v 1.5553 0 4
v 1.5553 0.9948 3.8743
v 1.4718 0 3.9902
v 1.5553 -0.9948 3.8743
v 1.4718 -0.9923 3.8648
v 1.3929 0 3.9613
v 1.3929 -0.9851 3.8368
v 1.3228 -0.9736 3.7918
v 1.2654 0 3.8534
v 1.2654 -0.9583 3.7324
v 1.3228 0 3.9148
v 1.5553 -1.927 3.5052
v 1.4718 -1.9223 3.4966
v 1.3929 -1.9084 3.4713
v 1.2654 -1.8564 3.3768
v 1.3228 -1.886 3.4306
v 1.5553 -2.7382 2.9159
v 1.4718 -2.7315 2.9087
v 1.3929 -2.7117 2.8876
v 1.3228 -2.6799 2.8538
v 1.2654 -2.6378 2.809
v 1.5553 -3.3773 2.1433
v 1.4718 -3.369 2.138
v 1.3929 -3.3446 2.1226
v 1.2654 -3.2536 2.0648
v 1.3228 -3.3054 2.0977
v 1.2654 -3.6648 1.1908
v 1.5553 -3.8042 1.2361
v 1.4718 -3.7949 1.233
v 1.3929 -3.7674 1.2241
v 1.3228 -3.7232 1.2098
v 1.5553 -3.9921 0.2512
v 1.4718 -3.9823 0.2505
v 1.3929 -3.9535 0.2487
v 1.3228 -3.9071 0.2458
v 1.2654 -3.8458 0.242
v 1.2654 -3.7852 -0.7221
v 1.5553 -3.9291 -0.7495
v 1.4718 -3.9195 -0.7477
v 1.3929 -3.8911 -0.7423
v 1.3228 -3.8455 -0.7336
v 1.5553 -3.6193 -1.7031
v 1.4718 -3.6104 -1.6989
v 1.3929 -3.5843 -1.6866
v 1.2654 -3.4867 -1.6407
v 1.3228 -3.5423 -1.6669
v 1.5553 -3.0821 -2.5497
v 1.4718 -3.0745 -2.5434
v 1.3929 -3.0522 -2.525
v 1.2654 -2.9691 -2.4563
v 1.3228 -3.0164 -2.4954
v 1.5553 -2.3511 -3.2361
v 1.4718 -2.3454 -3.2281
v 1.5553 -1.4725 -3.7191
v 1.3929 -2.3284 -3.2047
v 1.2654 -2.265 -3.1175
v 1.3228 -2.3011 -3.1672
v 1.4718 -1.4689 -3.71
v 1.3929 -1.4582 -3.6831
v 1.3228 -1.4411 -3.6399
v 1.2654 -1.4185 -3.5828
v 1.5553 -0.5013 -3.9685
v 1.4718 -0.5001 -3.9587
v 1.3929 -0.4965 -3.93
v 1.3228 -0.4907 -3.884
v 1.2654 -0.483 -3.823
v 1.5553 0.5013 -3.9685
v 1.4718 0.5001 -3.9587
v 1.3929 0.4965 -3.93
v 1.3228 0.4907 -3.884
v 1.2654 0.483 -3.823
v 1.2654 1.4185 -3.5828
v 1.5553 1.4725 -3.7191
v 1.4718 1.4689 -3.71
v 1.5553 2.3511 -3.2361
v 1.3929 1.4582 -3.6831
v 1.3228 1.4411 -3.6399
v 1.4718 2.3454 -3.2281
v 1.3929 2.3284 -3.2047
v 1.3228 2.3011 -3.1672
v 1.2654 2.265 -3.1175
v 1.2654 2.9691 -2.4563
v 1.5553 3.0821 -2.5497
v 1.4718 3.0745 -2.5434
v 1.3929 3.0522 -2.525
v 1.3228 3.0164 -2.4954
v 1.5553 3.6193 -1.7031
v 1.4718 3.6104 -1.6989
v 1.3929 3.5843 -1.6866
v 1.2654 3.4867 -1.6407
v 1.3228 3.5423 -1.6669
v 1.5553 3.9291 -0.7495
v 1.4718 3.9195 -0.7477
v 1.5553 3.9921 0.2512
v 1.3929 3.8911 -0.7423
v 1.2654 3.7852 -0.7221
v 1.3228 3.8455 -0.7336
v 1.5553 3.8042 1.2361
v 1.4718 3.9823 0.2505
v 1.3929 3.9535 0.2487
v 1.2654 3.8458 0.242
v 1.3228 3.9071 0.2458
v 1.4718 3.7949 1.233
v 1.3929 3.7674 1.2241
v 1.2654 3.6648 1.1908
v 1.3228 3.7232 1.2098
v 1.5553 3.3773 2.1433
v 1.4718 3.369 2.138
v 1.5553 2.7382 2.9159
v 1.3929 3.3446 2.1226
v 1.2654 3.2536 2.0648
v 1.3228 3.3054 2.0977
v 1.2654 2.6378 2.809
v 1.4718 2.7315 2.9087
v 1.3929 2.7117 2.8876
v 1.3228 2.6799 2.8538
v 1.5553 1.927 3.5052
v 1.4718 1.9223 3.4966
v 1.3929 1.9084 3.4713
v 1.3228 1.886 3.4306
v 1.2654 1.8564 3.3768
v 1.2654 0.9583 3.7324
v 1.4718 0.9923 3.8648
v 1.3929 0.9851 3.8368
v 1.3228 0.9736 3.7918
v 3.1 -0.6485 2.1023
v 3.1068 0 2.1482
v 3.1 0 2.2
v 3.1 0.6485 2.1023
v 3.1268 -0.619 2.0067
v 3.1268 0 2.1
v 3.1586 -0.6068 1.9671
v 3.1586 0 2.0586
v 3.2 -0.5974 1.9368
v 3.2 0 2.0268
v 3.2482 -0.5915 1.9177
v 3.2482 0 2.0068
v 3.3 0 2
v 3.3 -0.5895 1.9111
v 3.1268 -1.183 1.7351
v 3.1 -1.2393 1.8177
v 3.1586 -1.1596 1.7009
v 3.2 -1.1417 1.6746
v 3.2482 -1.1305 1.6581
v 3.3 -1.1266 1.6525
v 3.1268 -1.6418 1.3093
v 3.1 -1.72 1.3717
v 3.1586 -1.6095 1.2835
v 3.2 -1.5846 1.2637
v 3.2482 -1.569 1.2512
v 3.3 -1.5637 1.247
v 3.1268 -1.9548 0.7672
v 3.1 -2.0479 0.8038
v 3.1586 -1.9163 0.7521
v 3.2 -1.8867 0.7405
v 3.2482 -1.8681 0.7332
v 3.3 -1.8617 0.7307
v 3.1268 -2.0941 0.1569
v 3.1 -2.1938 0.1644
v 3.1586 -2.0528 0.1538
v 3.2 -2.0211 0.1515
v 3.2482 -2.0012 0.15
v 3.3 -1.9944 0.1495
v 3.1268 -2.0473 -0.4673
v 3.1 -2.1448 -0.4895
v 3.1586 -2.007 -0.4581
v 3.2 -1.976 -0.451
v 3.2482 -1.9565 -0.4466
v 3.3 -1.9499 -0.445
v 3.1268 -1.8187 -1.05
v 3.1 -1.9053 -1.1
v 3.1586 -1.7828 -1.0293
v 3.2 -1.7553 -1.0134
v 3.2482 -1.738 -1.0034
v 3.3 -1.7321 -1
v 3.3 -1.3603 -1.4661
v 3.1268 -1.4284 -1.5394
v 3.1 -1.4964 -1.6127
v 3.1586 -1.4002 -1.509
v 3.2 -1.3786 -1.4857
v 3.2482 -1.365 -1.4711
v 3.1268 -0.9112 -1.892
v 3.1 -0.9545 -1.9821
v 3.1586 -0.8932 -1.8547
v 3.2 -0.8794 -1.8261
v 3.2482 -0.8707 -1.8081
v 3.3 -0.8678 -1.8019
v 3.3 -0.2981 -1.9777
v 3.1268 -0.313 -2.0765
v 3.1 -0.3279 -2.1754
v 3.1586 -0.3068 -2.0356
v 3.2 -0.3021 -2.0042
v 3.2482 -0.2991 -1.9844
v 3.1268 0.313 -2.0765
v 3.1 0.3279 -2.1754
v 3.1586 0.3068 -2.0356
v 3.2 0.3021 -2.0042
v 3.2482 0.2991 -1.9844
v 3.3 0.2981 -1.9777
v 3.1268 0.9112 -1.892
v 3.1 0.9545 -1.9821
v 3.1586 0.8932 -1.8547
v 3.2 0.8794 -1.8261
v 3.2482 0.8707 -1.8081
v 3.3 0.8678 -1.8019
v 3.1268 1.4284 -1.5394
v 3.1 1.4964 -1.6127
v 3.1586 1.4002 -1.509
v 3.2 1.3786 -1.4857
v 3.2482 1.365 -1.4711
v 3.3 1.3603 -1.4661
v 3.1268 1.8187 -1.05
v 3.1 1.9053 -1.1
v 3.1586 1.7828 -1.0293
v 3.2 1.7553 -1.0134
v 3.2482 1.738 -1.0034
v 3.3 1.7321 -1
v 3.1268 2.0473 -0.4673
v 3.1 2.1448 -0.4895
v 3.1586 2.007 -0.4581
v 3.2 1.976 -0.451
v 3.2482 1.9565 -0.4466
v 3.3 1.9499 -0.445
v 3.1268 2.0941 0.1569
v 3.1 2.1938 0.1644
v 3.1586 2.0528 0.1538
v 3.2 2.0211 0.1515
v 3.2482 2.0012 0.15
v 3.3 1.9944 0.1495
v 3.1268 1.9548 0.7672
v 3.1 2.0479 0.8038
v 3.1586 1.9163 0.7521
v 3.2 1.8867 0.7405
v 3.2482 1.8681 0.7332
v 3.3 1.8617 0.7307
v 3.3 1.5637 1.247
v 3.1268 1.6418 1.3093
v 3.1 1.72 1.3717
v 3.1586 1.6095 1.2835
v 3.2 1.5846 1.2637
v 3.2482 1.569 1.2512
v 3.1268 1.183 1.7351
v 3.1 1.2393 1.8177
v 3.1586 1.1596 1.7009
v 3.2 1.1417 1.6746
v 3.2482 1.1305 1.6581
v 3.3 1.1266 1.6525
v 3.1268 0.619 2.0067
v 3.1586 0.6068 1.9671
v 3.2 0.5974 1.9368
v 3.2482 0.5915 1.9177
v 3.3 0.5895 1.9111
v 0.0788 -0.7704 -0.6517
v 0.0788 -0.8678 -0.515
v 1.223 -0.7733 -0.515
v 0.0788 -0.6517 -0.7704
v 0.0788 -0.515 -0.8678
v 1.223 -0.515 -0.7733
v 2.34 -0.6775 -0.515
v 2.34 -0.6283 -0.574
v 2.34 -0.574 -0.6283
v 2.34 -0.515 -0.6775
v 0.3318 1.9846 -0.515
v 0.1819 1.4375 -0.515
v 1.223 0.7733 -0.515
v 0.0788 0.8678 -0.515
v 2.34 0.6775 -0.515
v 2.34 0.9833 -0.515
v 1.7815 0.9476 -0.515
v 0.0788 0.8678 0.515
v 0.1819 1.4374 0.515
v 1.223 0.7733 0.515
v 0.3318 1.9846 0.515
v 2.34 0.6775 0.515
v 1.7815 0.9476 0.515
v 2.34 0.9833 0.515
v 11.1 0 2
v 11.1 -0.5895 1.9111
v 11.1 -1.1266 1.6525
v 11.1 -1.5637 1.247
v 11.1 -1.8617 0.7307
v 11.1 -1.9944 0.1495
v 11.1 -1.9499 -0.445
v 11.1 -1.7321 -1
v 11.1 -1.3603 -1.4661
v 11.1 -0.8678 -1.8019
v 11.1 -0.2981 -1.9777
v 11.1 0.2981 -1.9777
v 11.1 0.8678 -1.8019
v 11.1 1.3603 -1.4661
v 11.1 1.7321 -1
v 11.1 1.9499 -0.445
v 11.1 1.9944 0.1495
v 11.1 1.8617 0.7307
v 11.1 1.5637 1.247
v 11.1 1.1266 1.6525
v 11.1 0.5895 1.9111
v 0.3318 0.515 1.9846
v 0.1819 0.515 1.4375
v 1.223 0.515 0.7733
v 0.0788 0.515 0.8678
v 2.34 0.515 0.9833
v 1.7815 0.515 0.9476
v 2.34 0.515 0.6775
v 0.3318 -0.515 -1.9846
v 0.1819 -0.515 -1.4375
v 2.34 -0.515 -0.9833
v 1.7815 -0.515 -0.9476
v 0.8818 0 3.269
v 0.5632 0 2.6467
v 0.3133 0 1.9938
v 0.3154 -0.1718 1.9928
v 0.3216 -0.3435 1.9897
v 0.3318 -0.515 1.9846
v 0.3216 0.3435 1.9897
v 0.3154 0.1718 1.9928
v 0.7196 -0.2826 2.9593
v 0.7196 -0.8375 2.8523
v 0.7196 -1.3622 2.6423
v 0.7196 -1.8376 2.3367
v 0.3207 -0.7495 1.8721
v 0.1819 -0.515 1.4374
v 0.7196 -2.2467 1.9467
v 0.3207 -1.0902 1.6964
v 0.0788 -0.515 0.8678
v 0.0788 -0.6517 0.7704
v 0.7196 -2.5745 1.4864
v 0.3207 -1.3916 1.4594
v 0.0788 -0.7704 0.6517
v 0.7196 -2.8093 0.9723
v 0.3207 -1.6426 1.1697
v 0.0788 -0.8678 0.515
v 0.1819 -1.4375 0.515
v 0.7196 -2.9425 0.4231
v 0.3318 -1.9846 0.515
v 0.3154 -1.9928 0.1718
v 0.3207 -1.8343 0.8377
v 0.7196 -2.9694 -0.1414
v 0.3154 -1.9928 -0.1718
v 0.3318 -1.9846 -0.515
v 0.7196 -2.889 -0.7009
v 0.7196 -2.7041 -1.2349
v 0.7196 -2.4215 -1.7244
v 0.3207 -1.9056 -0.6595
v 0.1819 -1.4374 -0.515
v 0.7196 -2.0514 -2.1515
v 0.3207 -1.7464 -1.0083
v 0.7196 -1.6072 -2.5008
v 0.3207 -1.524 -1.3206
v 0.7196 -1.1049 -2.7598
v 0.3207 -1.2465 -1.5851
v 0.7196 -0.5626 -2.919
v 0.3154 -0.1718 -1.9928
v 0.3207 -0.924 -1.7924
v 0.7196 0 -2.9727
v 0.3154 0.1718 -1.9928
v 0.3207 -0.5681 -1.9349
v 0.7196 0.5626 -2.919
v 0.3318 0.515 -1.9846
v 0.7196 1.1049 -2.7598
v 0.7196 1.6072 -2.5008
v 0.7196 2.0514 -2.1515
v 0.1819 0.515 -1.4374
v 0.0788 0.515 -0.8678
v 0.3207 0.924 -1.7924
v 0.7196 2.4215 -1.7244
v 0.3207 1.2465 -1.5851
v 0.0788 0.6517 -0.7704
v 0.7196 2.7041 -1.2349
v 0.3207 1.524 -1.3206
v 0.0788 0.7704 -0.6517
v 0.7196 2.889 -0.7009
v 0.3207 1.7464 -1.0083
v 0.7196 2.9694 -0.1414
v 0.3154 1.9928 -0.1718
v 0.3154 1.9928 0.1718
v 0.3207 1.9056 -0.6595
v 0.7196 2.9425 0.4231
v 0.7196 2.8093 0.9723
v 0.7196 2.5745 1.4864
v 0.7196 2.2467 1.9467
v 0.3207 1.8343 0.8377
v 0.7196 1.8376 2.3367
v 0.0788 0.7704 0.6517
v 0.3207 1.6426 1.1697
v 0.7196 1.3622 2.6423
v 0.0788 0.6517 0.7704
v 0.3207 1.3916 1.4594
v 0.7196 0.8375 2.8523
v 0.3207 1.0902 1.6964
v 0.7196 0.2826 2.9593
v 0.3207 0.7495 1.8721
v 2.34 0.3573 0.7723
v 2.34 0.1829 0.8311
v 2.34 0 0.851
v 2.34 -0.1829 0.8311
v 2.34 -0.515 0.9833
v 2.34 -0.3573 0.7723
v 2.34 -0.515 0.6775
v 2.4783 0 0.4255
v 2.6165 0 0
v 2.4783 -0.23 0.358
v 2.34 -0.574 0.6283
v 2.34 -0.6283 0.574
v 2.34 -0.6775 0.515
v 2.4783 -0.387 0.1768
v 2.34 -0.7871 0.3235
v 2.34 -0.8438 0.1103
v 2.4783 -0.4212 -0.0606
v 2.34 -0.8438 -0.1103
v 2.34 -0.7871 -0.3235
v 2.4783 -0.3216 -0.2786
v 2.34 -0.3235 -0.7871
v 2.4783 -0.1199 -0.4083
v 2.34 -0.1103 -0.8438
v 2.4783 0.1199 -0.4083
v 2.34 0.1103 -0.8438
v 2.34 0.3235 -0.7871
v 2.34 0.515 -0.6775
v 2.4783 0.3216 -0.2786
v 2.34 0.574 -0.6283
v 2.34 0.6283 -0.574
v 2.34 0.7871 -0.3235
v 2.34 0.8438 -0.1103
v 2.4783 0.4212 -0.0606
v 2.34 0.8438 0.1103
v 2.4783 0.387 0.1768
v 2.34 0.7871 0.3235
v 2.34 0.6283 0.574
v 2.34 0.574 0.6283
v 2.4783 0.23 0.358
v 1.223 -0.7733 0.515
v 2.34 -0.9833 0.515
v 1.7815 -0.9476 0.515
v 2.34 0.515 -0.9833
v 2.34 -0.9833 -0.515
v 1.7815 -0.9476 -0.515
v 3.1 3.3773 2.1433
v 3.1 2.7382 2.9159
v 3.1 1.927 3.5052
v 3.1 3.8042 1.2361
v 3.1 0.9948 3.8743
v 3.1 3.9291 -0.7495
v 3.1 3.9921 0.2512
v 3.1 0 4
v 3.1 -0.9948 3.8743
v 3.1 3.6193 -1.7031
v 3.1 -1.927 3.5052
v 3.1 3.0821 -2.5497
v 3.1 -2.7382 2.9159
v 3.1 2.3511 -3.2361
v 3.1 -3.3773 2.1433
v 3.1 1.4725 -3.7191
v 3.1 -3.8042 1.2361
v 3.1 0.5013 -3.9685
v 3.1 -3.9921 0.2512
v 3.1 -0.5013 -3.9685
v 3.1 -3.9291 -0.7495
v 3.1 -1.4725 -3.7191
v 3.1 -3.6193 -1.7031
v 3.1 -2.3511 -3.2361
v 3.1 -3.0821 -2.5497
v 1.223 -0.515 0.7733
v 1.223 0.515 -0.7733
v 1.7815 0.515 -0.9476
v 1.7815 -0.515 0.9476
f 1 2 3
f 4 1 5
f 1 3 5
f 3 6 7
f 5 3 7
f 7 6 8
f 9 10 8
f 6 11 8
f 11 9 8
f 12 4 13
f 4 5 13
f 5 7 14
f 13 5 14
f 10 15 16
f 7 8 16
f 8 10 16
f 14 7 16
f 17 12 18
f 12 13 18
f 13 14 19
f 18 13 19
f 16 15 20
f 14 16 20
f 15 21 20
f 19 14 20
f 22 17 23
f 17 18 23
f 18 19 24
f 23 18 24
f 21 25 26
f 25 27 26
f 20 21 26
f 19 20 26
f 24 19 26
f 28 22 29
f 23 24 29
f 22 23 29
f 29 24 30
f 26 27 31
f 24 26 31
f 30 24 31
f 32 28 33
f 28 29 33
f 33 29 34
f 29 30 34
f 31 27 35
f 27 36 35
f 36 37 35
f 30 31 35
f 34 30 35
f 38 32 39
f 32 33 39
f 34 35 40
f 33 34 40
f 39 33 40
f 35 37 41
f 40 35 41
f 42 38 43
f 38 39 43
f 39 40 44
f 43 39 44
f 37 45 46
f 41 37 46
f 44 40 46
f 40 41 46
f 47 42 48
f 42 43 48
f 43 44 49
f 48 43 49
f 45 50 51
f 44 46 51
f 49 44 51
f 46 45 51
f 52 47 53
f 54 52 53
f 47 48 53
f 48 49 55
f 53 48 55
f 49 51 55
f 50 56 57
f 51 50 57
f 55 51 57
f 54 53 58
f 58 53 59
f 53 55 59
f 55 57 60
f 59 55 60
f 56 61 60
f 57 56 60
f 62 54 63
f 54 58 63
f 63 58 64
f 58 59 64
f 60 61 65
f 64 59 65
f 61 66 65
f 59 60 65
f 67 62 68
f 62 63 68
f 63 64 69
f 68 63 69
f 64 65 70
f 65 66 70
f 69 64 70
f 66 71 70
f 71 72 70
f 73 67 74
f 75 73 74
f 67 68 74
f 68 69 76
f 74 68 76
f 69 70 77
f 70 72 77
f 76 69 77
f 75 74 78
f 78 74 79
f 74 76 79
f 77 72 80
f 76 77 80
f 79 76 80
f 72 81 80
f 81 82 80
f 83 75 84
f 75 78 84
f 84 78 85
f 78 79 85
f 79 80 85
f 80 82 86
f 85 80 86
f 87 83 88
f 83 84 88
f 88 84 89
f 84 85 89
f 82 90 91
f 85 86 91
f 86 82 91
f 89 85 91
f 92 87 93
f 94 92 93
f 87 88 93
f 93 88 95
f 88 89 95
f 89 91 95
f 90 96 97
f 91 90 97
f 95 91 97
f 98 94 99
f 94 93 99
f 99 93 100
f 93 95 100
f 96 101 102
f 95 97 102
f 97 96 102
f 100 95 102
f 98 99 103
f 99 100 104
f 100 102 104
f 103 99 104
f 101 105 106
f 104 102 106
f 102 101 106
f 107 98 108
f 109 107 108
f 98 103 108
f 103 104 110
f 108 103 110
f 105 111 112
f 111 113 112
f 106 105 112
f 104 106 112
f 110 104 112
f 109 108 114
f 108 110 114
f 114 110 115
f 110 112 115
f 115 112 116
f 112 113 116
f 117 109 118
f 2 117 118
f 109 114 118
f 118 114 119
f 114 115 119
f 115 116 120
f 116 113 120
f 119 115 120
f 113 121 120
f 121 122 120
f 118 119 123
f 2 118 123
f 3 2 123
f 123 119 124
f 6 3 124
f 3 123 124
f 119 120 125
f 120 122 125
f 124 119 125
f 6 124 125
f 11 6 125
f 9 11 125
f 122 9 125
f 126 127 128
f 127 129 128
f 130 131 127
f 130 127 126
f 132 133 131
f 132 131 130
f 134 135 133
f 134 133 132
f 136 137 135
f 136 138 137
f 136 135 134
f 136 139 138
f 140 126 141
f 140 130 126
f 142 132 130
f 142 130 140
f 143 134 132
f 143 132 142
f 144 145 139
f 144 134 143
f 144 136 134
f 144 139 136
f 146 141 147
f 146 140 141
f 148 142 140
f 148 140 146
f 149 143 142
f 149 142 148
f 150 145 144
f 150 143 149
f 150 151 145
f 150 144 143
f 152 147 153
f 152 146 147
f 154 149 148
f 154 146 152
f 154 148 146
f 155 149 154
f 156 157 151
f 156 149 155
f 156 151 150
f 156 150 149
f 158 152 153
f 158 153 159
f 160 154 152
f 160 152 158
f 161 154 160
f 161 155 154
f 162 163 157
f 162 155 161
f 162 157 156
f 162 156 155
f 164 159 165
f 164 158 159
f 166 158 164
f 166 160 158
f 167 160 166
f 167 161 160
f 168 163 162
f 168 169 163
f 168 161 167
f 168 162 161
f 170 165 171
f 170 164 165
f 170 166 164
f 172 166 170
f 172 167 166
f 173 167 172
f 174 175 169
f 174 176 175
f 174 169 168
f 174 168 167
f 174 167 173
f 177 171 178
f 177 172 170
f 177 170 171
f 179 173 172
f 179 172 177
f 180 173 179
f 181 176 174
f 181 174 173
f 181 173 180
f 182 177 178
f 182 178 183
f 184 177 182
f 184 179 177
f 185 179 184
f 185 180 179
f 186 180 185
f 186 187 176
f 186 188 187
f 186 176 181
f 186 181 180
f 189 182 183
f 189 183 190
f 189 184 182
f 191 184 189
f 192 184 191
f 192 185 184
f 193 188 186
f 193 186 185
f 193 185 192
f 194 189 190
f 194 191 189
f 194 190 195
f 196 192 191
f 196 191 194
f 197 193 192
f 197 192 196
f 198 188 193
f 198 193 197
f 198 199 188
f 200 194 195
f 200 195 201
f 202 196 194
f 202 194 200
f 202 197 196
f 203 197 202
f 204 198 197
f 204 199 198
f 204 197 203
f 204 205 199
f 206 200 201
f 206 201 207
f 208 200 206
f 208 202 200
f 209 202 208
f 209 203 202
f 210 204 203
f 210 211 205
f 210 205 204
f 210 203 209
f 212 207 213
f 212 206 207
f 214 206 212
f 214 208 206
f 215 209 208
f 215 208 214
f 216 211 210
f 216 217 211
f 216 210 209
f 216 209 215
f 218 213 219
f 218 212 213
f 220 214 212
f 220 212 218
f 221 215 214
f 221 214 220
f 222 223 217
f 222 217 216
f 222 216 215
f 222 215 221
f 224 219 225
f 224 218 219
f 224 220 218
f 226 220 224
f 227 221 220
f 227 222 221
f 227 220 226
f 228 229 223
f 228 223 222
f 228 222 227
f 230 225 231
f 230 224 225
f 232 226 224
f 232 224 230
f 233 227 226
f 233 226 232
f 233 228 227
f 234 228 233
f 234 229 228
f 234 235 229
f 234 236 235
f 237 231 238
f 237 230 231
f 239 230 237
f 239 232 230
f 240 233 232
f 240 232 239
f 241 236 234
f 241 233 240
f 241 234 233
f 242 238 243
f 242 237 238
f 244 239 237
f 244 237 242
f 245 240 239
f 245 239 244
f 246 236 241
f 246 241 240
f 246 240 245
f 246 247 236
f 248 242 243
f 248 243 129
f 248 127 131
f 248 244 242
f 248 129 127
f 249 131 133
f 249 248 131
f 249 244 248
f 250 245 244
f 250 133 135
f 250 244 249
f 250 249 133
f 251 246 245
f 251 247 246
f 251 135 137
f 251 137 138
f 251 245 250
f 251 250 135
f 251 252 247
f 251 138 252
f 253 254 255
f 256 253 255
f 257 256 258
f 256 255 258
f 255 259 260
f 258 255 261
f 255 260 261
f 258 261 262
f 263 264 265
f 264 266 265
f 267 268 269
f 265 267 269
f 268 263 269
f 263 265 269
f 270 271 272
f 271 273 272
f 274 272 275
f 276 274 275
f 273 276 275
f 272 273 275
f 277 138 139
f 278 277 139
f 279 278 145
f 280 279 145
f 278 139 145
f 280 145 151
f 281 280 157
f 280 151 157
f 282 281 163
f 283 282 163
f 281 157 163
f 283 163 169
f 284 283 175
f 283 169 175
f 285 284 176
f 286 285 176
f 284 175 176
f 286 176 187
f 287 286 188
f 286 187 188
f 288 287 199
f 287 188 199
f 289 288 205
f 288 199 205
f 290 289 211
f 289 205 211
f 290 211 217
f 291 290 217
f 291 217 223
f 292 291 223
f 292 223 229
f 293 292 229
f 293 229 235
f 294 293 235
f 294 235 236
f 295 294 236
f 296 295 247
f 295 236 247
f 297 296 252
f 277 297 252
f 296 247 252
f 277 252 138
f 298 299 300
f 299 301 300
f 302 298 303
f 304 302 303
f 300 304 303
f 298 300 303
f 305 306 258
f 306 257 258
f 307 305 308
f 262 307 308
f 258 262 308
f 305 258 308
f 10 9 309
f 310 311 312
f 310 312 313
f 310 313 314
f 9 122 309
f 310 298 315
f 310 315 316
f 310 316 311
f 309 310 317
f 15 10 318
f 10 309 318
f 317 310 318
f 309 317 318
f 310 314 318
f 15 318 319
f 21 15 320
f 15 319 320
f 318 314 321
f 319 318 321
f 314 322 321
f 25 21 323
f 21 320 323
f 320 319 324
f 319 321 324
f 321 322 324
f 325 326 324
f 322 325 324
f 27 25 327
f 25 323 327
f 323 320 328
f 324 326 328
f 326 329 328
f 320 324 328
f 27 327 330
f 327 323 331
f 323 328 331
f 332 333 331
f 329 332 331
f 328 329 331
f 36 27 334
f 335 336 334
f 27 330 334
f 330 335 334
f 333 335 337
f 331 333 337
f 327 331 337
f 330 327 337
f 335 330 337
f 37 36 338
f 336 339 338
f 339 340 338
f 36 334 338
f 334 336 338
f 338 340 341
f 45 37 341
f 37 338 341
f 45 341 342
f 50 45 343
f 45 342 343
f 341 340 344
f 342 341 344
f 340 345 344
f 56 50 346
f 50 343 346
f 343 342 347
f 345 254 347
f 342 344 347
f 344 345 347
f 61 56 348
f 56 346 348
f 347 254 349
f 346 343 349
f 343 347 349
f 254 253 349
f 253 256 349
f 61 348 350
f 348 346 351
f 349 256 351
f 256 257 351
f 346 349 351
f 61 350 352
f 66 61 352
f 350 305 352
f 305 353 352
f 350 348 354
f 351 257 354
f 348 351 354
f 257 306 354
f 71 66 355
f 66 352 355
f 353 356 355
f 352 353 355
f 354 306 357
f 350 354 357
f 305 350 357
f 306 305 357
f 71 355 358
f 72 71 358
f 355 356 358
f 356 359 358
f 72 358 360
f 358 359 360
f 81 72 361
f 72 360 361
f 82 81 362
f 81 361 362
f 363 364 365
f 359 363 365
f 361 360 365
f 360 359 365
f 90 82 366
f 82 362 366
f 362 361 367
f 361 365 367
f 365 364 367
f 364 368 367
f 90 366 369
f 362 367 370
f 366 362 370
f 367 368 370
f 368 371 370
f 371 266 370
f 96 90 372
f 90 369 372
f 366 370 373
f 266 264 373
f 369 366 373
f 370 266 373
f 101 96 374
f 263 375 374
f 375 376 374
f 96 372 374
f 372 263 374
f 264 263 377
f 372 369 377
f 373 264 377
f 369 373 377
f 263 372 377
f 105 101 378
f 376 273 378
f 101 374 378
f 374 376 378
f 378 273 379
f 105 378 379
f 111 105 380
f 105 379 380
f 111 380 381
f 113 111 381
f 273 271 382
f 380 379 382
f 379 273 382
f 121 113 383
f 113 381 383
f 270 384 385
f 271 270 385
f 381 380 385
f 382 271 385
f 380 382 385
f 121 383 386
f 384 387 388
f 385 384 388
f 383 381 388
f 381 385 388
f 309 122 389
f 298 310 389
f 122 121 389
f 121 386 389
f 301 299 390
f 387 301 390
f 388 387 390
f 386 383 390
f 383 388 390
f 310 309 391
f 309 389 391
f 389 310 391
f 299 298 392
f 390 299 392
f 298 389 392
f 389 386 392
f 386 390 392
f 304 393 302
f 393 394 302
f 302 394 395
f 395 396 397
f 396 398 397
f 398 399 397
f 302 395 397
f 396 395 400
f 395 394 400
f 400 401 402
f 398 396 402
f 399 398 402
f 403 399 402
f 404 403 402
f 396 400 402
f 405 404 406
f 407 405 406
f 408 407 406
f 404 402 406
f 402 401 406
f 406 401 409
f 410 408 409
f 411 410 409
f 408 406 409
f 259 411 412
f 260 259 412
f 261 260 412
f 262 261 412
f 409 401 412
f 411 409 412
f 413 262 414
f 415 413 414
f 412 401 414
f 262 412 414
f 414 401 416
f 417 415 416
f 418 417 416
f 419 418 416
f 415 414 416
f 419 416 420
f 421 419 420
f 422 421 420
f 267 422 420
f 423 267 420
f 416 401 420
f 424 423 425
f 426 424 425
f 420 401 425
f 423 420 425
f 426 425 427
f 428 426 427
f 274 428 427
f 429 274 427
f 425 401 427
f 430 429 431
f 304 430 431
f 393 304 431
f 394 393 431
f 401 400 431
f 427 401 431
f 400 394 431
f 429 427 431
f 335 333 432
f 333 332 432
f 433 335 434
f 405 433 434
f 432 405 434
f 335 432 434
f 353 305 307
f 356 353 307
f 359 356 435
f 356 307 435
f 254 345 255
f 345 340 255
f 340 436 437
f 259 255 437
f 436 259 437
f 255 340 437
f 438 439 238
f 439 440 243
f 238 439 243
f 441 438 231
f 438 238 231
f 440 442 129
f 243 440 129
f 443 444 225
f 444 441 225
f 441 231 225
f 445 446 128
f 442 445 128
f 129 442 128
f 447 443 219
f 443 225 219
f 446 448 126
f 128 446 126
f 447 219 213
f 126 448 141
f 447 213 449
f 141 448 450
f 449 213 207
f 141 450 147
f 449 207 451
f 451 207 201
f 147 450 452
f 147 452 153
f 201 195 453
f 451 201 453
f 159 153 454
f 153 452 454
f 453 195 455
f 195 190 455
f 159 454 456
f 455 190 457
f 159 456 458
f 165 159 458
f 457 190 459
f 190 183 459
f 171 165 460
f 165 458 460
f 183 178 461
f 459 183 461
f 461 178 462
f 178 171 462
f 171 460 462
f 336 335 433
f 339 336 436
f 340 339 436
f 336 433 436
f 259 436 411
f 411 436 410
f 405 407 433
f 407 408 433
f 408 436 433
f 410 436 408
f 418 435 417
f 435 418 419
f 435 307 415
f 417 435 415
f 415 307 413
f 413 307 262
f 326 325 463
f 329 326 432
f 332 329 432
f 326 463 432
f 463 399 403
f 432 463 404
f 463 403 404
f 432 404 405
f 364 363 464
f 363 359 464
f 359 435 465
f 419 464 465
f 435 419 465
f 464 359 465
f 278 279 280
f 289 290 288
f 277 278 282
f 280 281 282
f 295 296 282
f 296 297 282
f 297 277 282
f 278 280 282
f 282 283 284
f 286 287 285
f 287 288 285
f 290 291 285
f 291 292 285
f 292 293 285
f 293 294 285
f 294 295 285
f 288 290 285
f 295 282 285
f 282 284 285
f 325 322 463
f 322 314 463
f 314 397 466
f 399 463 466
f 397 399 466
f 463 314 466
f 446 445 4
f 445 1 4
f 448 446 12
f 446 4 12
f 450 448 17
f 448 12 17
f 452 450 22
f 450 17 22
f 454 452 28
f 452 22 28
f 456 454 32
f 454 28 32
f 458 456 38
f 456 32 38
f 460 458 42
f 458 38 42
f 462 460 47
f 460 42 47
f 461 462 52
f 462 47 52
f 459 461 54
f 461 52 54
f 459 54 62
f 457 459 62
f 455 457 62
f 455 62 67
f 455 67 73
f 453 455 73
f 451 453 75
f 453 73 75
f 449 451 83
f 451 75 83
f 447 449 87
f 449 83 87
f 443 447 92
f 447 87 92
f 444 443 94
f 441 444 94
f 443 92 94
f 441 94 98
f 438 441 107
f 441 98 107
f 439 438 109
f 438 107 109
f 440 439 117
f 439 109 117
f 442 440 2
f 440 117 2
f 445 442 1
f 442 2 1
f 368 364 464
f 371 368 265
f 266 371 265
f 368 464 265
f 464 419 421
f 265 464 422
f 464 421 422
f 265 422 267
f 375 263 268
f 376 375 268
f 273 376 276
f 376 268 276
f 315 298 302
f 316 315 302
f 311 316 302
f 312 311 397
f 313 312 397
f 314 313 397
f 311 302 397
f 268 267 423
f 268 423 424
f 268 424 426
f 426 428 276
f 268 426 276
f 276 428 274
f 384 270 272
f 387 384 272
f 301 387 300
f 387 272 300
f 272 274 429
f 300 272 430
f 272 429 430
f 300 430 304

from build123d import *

# Parameters (mm, degrees)
FILLET1_R    = 0.2
SKETCH3_W    = 1.03
SKETCH3_H    = 4.3
SKETCH4_W    = 1.03
SKETCH4_H    = 1.966638154
RECPAT_COUNT = 2
RECPAT_ANGLE = 90


with BuildPart() as part:
    # BodySke → Base-Revolve (revolve)
    with BuildSketch(Plane.XY, mode=Mode.PRIVATE) as base_revolve_sk:
        with BuildLine():
            Line((3.1, 2), (3.1, 4))
            Line((3.1, 4), (1.555305874, 4))
            ThreePointArc((1.555305874, 4), (1.392873227, 3.961271902), (1.265388955, 3.853420195))
            ThreePointArc((1.265388955, 3.853420195), (0.324444487, 2.027933456), (0, 0))
            Line((0, 0), (11.1, 0))
            Line((11.1, 0), (11.1, 2))
            Line((11.1, 2), (3.1, 2))
        make_face()
    revolve(base_revolve_sk.sketch.rotate(Axis((-25.4, 0, 0), (1, 0, 0)), 90), axis=Axis((-25.4, 0, 0), (1, 0, 0)))  # turned: the seam where the file's is

    # Fillet1
    fillet1_edges = [part.edges().sort_by_distance(p)[0] for p in [
        (3.1, 0, -2),
    ]]
    fillet(fillet1_edges, radius=FILLET1_R)

    # Sketch3 → Recess section 0
    with BuildSketch(Plane(origin=(0, 0, 0), x_dir=(0, 0, -1), z_dir=(1, 0, 0))):
        Rectangle(SKETCH3_W, SKETCH3_H)
    # Sketch4 → Recess section 1
    with BuildSketch(Plane(origin=(2.34, 0, 0), x_dir=(0, 0, -1), z_dir=(1, 0, 0))):
        Rectangle(SKETCH4_W, SKETCH4_H)
    recess = loft(mode=Mode.SUBTRACT)

    # RecPat: Recess ×2 about axis
    recpat_axis = Axis((-25.4, 0, 0), (1, 0, 0))
    for i in range(1, RECPAT_COUNT):
        add(recess.rotate(recpat_axis, i * RECPAT_ANGLE / (RECPAT_COUNT - 1)), mode=Mode.SUBTRACT)

    # RecCorSke → RecessCore (revolve, cut)
    with BuildSketch(Plane.XY, mode=Mode.PRIVATE) as recesscore_sk:
        Polygon((0, 0), (0, 1.01462874), (2.34, 0.851), (2.616506661, 0), align=None)
    revolve(recesscore_sk.sketch.rotate(Axis((-3.175, 0, 0), (1, 0, 0)), 90), axis=Axis((-3.175, 0, 0), (1, 0, 0)), mode=Mode.SUBTRACT)  # turned: the seam where the file's is


solid = part.part
